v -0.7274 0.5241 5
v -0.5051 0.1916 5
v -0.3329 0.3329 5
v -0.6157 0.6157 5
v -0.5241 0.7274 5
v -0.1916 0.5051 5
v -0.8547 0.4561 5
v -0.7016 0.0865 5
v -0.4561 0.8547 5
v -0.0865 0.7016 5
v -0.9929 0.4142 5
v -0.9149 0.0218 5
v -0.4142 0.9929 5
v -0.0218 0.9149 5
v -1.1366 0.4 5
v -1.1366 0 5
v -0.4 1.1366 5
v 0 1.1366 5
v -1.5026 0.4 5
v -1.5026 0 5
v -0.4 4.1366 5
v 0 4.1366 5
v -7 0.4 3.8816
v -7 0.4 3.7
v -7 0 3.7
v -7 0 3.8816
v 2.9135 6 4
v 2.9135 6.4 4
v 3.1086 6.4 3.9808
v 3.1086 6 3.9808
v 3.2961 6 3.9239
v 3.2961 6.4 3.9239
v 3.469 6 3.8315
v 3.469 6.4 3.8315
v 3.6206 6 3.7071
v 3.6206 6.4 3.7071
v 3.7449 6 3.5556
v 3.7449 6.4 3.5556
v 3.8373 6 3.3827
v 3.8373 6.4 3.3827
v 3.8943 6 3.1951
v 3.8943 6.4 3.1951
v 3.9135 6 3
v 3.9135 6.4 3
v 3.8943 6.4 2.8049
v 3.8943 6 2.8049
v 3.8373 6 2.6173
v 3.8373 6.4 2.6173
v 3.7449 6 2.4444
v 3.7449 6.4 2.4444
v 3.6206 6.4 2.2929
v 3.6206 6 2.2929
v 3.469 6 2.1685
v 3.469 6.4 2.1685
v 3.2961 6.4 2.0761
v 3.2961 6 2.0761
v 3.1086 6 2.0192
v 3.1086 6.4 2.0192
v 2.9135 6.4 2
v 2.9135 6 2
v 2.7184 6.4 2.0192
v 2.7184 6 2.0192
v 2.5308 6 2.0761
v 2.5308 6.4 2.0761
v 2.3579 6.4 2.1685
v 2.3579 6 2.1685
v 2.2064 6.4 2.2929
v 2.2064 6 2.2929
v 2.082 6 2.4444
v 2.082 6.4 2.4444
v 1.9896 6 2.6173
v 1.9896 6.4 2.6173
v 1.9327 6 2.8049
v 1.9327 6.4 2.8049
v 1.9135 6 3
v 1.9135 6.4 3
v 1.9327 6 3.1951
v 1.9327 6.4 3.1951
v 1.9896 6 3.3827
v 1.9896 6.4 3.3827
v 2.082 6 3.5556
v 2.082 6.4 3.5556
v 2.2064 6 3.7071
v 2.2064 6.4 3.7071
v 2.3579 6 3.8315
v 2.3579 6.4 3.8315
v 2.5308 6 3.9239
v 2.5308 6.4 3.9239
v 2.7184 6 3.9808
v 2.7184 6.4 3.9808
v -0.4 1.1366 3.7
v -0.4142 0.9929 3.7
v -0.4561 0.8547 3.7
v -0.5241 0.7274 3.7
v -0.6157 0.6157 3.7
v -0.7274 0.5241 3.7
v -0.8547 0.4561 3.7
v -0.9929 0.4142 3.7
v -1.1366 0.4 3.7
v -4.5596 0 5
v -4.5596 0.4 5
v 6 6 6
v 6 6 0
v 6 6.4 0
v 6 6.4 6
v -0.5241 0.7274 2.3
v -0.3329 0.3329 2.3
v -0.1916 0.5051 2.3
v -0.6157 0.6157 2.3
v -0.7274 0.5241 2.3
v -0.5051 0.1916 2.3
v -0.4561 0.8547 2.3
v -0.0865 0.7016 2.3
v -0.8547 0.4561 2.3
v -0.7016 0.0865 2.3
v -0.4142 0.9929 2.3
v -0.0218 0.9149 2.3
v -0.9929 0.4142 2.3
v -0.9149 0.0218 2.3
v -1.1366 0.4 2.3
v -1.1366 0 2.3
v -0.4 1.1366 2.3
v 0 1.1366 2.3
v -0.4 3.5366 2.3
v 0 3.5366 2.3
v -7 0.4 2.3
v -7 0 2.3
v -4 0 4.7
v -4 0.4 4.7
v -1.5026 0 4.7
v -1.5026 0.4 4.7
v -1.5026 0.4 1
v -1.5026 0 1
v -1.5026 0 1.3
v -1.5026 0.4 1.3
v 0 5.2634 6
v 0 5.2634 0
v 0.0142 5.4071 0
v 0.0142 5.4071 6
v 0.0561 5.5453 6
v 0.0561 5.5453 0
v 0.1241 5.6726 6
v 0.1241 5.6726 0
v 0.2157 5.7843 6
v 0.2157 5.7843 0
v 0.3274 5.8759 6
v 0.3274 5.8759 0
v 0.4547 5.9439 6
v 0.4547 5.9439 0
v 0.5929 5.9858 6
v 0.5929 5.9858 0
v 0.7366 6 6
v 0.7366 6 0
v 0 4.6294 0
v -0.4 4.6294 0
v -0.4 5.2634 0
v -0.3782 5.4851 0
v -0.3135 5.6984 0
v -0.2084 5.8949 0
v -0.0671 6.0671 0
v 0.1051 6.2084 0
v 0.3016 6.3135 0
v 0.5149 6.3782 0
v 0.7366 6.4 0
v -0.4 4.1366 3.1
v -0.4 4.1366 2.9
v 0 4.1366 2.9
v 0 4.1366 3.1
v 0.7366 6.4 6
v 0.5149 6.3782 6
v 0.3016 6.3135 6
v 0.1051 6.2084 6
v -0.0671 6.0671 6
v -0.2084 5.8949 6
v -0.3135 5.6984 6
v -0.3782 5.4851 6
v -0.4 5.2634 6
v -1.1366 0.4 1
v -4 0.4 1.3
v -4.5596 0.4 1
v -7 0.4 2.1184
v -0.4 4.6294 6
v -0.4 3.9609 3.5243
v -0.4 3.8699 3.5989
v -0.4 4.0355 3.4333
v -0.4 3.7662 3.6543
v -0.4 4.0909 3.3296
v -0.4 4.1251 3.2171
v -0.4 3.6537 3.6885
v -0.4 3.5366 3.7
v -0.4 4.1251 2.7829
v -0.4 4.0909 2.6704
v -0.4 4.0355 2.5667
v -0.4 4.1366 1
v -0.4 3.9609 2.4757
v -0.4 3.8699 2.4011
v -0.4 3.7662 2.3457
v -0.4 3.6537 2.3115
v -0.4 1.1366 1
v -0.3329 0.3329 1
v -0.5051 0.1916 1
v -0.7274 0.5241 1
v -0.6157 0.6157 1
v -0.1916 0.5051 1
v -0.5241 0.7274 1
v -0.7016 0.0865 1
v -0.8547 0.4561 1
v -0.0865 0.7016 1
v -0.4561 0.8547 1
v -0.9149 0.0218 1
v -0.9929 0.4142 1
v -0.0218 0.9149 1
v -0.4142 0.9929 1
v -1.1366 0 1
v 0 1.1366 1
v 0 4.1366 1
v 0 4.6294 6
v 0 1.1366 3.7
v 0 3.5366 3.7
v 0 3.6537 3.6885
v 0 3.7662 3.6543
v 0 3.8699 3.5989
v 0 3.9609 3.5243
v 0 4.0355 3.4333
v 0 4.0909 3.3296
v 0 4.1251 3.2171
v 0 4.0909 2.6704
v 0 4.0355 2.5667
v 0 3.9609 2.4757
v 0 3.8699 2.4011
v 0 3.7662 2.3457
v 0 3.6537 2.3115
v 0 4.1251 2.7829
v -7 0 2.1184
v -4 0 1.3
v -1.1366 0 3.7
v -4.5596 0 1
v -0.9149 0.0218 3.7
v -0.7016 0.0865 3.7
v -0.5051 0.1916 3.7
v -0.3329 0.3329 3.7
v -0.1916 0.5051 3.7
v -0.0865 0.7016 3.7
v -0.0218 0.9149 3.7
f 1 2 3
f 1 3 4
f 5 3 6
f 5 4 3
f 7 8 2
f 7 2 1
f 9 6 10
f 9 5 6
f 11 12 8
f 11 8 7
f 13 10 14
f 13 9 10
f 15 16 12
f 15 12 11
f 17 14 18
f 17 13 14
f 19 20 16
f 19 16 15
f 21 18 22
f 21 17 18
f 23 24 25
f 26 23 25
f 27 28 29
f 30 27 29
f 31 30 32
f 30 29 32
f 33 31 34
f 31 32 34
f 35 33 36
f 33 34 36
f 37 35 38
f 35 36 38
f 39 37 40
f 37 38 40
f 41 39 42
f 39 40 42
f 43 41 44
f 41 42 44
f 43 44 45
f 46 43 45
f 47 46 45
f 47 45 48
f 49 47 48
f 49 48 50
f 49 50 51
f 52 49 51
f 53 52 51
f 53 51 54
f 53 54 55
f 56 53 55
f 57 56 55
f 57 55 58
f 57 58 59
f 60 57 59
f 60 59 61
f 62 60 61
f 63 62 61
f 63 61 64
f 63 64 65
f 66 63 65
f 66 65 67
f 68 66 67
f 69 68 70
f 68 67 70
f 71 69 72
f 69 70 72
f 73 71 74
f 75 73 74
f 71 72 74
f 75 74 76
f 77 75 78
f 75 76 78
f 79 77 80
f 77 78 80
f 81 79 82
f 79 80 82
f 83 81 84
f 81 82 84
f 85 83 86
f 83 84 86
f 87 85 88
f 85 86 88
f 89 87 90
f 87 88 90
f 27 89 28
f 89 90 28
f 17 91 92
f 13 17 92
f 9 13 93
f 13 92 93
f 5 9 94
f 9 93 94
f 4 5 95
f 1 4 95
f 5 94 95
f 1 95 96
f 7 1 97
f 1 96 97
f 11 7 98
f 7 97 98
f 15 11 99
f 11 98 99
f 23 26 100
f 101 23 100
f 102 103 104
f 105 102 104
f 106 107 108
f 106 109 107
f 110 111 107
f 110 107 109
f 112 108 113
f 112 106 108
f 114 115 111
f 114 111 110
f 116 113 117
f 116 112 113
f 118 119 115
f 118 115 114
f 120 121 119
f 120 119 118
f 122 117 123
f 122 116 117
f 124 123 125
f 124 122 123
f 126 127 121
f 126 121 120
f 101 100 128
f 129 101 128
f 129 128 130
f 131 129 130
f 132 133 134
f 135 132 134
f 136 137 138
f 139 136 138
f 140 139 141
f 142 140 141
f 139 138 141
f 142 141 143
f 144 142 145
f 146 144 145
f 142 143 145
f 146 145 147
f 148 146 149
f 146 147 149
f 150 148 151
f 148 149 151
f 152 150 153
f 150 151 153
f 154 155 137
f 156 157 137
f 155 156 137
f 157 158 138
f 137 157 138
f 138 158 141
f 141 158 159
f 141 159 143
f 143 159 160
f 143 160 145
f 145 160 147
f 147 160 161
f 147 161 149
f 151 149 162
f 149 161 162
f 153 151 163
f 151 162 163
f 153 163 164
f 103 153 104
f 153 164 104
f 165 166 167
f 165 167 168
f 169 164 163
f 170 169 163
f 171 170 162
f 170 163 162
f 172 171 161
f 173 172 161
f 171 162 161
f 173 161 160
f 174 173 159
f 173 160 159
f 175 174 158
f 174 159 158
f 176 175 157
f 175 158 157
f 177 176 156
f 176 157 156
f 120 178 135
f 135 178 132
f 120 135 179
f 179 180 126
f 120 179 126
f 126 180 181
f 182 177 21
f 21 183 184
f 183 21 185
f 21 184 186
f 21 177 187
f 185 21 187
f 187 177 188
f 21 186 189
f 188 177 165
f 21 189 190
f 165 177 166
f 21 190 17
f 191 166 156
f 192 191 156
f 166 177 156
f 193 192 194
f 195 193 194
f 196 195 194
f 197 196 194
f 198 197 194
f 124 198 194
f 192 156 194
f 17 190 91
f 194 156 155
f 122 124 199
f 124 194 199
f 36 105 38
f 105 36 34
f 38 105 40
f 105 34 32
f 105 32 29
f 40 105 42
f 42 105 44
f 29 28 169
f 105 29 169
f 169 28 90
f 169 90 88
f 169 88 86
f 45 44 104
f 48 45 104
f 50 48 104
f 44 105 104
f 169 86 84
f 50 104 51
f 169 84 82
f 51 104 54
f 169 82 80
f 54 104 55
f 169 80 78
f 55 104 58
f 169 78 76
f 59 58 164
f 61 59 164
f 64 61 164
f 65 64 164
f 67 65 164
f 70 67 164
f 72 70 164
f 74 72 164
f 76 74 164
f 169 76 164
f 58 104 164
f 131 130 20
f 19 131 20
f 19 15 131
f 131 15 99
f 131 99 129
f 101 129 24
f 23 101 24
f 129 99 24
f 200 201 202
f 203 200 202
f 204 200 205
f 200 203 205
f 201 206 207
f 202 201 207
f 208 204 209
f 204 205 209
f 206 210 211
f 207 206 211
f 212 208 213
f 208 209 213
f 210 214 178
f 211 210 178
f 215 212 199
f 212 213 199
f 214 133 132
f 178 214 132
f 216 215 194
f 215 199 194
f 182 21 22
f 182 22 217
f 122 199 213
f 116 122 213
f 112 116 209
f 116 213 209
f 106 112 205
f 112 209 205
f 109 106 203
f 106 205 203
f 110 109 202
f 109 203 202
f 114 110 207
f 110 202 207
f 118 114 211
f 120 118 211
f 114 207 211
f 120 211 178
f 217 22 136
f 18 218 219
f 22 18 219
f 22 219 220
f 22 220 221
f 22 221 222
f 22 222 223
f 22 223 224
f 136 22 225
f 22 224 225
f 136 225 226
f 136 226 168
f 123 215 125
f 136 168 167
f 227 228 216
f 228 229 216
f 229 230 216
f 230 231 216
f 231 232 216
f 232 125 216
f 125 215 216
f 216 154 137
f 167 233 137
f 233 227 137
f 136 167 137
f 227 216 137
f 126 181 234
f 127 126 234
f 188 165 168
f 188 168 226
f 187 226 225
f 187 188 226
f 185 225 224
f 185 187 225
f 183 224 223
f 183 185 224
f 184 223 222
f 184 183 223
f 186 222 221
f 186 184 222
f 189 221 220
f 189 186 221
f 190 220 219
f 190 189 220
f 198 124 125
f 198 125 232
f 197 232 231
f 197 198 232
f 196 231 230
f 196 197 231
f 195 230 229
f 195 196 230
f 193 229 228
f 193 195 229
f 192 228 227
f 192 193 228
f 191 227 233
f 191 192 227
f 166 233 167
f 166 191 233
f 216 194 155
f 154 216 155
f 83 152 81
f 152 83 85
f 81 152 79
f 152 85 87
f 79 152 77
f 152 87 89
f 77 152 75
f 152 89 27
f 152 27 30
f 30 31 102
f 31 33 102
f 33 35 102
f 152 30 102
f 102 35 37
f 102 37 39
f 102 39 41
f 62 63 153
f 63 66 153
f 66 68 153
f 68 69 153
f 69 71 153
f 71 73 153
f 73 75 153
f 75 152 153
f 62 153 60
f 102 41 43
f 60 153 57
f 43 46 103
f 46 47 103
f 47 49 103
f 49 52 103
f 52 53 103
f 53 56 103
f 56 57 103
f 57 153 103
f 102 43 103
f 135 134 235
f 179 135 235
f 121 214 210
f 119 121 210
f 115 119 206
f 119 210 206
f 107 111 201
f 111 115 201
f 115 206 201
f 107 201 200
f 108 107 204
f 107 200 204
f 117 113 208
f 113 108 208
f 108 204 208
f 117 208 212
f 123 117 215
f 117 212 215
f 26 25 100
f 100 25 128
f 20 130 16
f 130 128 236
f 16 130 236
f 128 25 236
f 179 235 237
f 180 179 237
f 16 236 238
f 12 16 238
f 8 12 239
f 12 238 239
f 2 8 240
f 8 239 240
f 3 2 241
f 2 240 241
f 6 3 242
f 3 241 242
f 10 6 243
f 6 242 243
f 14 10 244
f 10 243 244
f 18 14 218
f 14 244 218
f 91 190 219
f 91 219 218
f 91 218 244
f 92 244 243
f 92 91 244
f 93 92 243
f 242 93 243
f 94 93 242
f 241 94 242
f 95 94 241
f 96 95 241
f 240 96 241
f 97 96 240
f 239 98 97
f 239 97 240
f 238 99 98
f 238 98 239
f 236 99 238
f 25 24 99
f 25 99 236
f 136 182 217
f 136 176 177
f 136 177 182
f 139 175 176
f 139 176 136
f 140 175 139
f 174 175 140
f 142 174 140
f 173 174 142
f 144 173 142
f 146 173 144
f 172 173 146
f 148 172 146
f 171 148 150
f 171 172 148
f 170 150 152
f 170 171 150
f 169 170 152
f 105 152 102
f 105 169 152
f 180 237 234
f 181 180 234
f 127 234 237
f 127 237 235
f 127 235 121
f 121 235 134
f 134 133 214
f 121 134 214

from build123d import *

# Parameters (mm, degrees)
SM_BASE_FLANGE_1_DEPTH = 6
SKETCH_5_R             = 1
CUT_EXTRUDE_1_DEPTH    = 12.223190277
CUT_EXTRUDE_3_REACH    = 17.683
CUT_EXTRUDE_4_REACH    = 13.223


# Sheet-metal steps are written as plain solids
with BuildPart() as part:
    # Sketch 1 → 基体-法兰1 (new body)
    with BuildSketch(Plane.XY):
        with BuildLine():
            Line((-7, 0), (-1.1366, 0))
            ThreePointArc((-1.1366, 0), (-0.332902433, 0.332902433), (0, 1.1366))
            Line((0, 1.1366), (0, 5.2634))
            ThreePointArc((0, 5.2634), (0.215745145, 5.784254855), (0.7366, 6))
            Line((0.7366, 6), (6, 6))
            Line((6, 6), (6, 6.4))
            Line((6, 6.4), (0.7366, 6.4))
            ThreePointArc((0.7366, 6.4), (-0.067097567, 6.067097567), (-0.4, 5.2634))
            Line((-0.4, 5.2634), (-0.4, 1.1366))
            ThreePointArc((-0.4, 1.1366), (-0.615745145, 0.615745145), (-1.1366, 0.4))
            Line((-1.1366, 0.4), (-7, 0.4))
            Line((-7, 0.4), (-7, 0))
        make_face()
    extrude(amount=SM_BASE_FLANGE_1_DEPTH)

    # 草图5 → 切除-拉伸1 (cut, through all)
    with BuildSketch(Plane(origin=(0, 6.4, 0), x_dir=(1, 0, 0), z_dir=(0, 1, 0))):
        with Locations(Location((2.913465792, -3, 0), (0, 0, 270))):
            Circle(SKETCH_5_R)
    extrude(amount=-CUT_EXTRUDE_1_DEPTH, mode=Mode.SUBTRACT)

    # 草图6 → 切除-拉伸3 (cut, up to next)
    with BuildSketch(Plane.ZY.offset(7), mode=Mode.PRIVATE) as cut_extrude_3_sk1:
        with BuildLine():
            Line((2.3, -3.316111615), (2.3, 3.5366))
            ThreePointArc((2.3, 3.5366), (2.475735931, 3.960864069), (2.9, 4.1366))
            Line((2.9, 4.1366), (3, 4.1366))
            Line((3, 4.1366), (3.1, 4.1366))
            ThreePointArc((3.1, 4.1366), (3.524264069, 3.960864069), (3.7, 3.5366))
            Line((3.7, 3.5366), (3.7, -3.316111615))
            Line((3.7, -3.316111615), (2.3, -3.316111615))
        make_face()
    cut_extrude_3_tool1 = extrude(cut_extrude_3_sk1.sketch, amount=-CUT_EXTRUDE_3_REACH, mode=Mode.PRIVATE) & part.part
    # 草图6 → 切除-拉伸3 (cut, up to next)
    with BuildSketch(Plane.ZY.offset(7), mode=Mode.PRIVATE) as cut_extrude_3_sk2:
        Polygon((1, -3.316111615), (1, 4.1366), (0, 4.629449722), (0, -3.316111615), align=None)
    cut_extrude_3_tool2 = extrude(cut_extrude_3_sk2.sketch, amount=-CUT_EXTRUDE_3_REACH, mode=Mode.PRIVATE) & part.part
    # 草图6 → 切除-拉伸3 (cut, up to next)
    with BuildSketch(Plane.ZY.offset(7), mode=Mode.PRIVATE) as cut_extrude_3_sk3:
        Polygon((5, 4.1366), (6, 4.629449722), (6, -3.316111615), (5, -3.316111615), align=None)
    cut_extrude_3_tool3 = extrude(cut_extrude_3_sk3.sketch, amount=-CUT_EXTRUDE_3_REACH, mode=Mode.PRIVATE) & part.part
    add(cut_extrude_3_tool1.solids().sort_by_distance((-7, 0.356246, 3))[0], mode=Mode.SUBTRACT)
    add(cut_extrude_3_tool2.solids().sort_by_distance((-7, 0.534771, 0.494666))[0], mode=Mode.SUBTRACT)
    add(cut_extrude_3_tool3.solids().sort_by_distance((-7, 0.534771, 5.505334))[0], mode=Mode.SUBTRACT)

    # 草图7 → 切除-拉伸4 (cut, up to next)
    with BuildSketch(Plane.XZ, mode=Mode.PRIVATE) as cut_extrude_4_sk1:
        Polygon((-7, 3.881631359), (-4.559628285, 5), (-7, 5), align=None)
    cut_extrude_4_tool1 = extrude(cut_extrude_4_sk1.sketch, amount=-CUT_EXTRUDE_4_REACH, mode=Mode.PRIVATE) & part.part
    # 草图7 → 切除-拉伸4 (cut, up to next)
    with BuildSketch(Plane.XZ, mode=Mode.PRIVATE) as cut_extrude_4_sk2:
        Polygon((-1.502616723, 5), (-4, 5), (-4.559628285, 5), (-4, 4.7), (-1.502616723, 4.7), align=None)
    cut_extrude_4_tool2 = extrude(cut_extrude_4_sk2.sketch, amount=-CUT_EXTRUDE_4_REACH, mode=Mode.PRIVATE) & part.part
    # 草图7 → 切除-拉伸4 (cut, up to next)
    with BuildSketch(Plane.XZ, mode=Mode.PRIVATE) as cut_extrude_4_sk3:
        Polygon((-7, 2.118368641), (-7, 1), (-4.559628285, 1), align=None)
    cut_extrude_4_tool3 = extrude(cut_extrude_4_sk3.sketch, amount=-CUT_EXTRUDE_4_REACH, mode=Mode.PRIVATE) & part.part
    # 草图7 → 切除-拉伸4 (cut, up to next)
    with BuildSketch(Plane.XZ, mode=Mode.PRIVATE) as cut_extrude_4_sk4:
        Polygon((-4, 1.3), (-4.559628285, 1), (-4, 1), (-1.502616723, 1), (-1.502616723, 1.3), align=None)
    cut_extrude_4_tool4 = extrude(cut_extrude_4_sk4.sketch, amount=-CUT_EXTRUDE_4_REACH, mode=Mode.PRIVATE) & part.part
    add(cut_extrude_4_tool1.solids().sort_by_distance((-6.186543, 0, 4.62721))[0], mode=Mode.SUBTRACT)
    add(cut_extrude_4_tool2.solids().sort_by_distance((-2.895914, 0, 4.855038))[0], mode=Mode.SUBTRACT)
    add(cut_extrude_4_tool3.solids().sort_by_distance((-6.186543, 0, 1.37279))[0], mode=Mode.SUBTRACT)
    add(cut_extrude_4_tool4.solids().sort_by_distance((-2.895914, 0, 1.144962))[0], mode=Mode.SUBTRACT)


solid = part.part
